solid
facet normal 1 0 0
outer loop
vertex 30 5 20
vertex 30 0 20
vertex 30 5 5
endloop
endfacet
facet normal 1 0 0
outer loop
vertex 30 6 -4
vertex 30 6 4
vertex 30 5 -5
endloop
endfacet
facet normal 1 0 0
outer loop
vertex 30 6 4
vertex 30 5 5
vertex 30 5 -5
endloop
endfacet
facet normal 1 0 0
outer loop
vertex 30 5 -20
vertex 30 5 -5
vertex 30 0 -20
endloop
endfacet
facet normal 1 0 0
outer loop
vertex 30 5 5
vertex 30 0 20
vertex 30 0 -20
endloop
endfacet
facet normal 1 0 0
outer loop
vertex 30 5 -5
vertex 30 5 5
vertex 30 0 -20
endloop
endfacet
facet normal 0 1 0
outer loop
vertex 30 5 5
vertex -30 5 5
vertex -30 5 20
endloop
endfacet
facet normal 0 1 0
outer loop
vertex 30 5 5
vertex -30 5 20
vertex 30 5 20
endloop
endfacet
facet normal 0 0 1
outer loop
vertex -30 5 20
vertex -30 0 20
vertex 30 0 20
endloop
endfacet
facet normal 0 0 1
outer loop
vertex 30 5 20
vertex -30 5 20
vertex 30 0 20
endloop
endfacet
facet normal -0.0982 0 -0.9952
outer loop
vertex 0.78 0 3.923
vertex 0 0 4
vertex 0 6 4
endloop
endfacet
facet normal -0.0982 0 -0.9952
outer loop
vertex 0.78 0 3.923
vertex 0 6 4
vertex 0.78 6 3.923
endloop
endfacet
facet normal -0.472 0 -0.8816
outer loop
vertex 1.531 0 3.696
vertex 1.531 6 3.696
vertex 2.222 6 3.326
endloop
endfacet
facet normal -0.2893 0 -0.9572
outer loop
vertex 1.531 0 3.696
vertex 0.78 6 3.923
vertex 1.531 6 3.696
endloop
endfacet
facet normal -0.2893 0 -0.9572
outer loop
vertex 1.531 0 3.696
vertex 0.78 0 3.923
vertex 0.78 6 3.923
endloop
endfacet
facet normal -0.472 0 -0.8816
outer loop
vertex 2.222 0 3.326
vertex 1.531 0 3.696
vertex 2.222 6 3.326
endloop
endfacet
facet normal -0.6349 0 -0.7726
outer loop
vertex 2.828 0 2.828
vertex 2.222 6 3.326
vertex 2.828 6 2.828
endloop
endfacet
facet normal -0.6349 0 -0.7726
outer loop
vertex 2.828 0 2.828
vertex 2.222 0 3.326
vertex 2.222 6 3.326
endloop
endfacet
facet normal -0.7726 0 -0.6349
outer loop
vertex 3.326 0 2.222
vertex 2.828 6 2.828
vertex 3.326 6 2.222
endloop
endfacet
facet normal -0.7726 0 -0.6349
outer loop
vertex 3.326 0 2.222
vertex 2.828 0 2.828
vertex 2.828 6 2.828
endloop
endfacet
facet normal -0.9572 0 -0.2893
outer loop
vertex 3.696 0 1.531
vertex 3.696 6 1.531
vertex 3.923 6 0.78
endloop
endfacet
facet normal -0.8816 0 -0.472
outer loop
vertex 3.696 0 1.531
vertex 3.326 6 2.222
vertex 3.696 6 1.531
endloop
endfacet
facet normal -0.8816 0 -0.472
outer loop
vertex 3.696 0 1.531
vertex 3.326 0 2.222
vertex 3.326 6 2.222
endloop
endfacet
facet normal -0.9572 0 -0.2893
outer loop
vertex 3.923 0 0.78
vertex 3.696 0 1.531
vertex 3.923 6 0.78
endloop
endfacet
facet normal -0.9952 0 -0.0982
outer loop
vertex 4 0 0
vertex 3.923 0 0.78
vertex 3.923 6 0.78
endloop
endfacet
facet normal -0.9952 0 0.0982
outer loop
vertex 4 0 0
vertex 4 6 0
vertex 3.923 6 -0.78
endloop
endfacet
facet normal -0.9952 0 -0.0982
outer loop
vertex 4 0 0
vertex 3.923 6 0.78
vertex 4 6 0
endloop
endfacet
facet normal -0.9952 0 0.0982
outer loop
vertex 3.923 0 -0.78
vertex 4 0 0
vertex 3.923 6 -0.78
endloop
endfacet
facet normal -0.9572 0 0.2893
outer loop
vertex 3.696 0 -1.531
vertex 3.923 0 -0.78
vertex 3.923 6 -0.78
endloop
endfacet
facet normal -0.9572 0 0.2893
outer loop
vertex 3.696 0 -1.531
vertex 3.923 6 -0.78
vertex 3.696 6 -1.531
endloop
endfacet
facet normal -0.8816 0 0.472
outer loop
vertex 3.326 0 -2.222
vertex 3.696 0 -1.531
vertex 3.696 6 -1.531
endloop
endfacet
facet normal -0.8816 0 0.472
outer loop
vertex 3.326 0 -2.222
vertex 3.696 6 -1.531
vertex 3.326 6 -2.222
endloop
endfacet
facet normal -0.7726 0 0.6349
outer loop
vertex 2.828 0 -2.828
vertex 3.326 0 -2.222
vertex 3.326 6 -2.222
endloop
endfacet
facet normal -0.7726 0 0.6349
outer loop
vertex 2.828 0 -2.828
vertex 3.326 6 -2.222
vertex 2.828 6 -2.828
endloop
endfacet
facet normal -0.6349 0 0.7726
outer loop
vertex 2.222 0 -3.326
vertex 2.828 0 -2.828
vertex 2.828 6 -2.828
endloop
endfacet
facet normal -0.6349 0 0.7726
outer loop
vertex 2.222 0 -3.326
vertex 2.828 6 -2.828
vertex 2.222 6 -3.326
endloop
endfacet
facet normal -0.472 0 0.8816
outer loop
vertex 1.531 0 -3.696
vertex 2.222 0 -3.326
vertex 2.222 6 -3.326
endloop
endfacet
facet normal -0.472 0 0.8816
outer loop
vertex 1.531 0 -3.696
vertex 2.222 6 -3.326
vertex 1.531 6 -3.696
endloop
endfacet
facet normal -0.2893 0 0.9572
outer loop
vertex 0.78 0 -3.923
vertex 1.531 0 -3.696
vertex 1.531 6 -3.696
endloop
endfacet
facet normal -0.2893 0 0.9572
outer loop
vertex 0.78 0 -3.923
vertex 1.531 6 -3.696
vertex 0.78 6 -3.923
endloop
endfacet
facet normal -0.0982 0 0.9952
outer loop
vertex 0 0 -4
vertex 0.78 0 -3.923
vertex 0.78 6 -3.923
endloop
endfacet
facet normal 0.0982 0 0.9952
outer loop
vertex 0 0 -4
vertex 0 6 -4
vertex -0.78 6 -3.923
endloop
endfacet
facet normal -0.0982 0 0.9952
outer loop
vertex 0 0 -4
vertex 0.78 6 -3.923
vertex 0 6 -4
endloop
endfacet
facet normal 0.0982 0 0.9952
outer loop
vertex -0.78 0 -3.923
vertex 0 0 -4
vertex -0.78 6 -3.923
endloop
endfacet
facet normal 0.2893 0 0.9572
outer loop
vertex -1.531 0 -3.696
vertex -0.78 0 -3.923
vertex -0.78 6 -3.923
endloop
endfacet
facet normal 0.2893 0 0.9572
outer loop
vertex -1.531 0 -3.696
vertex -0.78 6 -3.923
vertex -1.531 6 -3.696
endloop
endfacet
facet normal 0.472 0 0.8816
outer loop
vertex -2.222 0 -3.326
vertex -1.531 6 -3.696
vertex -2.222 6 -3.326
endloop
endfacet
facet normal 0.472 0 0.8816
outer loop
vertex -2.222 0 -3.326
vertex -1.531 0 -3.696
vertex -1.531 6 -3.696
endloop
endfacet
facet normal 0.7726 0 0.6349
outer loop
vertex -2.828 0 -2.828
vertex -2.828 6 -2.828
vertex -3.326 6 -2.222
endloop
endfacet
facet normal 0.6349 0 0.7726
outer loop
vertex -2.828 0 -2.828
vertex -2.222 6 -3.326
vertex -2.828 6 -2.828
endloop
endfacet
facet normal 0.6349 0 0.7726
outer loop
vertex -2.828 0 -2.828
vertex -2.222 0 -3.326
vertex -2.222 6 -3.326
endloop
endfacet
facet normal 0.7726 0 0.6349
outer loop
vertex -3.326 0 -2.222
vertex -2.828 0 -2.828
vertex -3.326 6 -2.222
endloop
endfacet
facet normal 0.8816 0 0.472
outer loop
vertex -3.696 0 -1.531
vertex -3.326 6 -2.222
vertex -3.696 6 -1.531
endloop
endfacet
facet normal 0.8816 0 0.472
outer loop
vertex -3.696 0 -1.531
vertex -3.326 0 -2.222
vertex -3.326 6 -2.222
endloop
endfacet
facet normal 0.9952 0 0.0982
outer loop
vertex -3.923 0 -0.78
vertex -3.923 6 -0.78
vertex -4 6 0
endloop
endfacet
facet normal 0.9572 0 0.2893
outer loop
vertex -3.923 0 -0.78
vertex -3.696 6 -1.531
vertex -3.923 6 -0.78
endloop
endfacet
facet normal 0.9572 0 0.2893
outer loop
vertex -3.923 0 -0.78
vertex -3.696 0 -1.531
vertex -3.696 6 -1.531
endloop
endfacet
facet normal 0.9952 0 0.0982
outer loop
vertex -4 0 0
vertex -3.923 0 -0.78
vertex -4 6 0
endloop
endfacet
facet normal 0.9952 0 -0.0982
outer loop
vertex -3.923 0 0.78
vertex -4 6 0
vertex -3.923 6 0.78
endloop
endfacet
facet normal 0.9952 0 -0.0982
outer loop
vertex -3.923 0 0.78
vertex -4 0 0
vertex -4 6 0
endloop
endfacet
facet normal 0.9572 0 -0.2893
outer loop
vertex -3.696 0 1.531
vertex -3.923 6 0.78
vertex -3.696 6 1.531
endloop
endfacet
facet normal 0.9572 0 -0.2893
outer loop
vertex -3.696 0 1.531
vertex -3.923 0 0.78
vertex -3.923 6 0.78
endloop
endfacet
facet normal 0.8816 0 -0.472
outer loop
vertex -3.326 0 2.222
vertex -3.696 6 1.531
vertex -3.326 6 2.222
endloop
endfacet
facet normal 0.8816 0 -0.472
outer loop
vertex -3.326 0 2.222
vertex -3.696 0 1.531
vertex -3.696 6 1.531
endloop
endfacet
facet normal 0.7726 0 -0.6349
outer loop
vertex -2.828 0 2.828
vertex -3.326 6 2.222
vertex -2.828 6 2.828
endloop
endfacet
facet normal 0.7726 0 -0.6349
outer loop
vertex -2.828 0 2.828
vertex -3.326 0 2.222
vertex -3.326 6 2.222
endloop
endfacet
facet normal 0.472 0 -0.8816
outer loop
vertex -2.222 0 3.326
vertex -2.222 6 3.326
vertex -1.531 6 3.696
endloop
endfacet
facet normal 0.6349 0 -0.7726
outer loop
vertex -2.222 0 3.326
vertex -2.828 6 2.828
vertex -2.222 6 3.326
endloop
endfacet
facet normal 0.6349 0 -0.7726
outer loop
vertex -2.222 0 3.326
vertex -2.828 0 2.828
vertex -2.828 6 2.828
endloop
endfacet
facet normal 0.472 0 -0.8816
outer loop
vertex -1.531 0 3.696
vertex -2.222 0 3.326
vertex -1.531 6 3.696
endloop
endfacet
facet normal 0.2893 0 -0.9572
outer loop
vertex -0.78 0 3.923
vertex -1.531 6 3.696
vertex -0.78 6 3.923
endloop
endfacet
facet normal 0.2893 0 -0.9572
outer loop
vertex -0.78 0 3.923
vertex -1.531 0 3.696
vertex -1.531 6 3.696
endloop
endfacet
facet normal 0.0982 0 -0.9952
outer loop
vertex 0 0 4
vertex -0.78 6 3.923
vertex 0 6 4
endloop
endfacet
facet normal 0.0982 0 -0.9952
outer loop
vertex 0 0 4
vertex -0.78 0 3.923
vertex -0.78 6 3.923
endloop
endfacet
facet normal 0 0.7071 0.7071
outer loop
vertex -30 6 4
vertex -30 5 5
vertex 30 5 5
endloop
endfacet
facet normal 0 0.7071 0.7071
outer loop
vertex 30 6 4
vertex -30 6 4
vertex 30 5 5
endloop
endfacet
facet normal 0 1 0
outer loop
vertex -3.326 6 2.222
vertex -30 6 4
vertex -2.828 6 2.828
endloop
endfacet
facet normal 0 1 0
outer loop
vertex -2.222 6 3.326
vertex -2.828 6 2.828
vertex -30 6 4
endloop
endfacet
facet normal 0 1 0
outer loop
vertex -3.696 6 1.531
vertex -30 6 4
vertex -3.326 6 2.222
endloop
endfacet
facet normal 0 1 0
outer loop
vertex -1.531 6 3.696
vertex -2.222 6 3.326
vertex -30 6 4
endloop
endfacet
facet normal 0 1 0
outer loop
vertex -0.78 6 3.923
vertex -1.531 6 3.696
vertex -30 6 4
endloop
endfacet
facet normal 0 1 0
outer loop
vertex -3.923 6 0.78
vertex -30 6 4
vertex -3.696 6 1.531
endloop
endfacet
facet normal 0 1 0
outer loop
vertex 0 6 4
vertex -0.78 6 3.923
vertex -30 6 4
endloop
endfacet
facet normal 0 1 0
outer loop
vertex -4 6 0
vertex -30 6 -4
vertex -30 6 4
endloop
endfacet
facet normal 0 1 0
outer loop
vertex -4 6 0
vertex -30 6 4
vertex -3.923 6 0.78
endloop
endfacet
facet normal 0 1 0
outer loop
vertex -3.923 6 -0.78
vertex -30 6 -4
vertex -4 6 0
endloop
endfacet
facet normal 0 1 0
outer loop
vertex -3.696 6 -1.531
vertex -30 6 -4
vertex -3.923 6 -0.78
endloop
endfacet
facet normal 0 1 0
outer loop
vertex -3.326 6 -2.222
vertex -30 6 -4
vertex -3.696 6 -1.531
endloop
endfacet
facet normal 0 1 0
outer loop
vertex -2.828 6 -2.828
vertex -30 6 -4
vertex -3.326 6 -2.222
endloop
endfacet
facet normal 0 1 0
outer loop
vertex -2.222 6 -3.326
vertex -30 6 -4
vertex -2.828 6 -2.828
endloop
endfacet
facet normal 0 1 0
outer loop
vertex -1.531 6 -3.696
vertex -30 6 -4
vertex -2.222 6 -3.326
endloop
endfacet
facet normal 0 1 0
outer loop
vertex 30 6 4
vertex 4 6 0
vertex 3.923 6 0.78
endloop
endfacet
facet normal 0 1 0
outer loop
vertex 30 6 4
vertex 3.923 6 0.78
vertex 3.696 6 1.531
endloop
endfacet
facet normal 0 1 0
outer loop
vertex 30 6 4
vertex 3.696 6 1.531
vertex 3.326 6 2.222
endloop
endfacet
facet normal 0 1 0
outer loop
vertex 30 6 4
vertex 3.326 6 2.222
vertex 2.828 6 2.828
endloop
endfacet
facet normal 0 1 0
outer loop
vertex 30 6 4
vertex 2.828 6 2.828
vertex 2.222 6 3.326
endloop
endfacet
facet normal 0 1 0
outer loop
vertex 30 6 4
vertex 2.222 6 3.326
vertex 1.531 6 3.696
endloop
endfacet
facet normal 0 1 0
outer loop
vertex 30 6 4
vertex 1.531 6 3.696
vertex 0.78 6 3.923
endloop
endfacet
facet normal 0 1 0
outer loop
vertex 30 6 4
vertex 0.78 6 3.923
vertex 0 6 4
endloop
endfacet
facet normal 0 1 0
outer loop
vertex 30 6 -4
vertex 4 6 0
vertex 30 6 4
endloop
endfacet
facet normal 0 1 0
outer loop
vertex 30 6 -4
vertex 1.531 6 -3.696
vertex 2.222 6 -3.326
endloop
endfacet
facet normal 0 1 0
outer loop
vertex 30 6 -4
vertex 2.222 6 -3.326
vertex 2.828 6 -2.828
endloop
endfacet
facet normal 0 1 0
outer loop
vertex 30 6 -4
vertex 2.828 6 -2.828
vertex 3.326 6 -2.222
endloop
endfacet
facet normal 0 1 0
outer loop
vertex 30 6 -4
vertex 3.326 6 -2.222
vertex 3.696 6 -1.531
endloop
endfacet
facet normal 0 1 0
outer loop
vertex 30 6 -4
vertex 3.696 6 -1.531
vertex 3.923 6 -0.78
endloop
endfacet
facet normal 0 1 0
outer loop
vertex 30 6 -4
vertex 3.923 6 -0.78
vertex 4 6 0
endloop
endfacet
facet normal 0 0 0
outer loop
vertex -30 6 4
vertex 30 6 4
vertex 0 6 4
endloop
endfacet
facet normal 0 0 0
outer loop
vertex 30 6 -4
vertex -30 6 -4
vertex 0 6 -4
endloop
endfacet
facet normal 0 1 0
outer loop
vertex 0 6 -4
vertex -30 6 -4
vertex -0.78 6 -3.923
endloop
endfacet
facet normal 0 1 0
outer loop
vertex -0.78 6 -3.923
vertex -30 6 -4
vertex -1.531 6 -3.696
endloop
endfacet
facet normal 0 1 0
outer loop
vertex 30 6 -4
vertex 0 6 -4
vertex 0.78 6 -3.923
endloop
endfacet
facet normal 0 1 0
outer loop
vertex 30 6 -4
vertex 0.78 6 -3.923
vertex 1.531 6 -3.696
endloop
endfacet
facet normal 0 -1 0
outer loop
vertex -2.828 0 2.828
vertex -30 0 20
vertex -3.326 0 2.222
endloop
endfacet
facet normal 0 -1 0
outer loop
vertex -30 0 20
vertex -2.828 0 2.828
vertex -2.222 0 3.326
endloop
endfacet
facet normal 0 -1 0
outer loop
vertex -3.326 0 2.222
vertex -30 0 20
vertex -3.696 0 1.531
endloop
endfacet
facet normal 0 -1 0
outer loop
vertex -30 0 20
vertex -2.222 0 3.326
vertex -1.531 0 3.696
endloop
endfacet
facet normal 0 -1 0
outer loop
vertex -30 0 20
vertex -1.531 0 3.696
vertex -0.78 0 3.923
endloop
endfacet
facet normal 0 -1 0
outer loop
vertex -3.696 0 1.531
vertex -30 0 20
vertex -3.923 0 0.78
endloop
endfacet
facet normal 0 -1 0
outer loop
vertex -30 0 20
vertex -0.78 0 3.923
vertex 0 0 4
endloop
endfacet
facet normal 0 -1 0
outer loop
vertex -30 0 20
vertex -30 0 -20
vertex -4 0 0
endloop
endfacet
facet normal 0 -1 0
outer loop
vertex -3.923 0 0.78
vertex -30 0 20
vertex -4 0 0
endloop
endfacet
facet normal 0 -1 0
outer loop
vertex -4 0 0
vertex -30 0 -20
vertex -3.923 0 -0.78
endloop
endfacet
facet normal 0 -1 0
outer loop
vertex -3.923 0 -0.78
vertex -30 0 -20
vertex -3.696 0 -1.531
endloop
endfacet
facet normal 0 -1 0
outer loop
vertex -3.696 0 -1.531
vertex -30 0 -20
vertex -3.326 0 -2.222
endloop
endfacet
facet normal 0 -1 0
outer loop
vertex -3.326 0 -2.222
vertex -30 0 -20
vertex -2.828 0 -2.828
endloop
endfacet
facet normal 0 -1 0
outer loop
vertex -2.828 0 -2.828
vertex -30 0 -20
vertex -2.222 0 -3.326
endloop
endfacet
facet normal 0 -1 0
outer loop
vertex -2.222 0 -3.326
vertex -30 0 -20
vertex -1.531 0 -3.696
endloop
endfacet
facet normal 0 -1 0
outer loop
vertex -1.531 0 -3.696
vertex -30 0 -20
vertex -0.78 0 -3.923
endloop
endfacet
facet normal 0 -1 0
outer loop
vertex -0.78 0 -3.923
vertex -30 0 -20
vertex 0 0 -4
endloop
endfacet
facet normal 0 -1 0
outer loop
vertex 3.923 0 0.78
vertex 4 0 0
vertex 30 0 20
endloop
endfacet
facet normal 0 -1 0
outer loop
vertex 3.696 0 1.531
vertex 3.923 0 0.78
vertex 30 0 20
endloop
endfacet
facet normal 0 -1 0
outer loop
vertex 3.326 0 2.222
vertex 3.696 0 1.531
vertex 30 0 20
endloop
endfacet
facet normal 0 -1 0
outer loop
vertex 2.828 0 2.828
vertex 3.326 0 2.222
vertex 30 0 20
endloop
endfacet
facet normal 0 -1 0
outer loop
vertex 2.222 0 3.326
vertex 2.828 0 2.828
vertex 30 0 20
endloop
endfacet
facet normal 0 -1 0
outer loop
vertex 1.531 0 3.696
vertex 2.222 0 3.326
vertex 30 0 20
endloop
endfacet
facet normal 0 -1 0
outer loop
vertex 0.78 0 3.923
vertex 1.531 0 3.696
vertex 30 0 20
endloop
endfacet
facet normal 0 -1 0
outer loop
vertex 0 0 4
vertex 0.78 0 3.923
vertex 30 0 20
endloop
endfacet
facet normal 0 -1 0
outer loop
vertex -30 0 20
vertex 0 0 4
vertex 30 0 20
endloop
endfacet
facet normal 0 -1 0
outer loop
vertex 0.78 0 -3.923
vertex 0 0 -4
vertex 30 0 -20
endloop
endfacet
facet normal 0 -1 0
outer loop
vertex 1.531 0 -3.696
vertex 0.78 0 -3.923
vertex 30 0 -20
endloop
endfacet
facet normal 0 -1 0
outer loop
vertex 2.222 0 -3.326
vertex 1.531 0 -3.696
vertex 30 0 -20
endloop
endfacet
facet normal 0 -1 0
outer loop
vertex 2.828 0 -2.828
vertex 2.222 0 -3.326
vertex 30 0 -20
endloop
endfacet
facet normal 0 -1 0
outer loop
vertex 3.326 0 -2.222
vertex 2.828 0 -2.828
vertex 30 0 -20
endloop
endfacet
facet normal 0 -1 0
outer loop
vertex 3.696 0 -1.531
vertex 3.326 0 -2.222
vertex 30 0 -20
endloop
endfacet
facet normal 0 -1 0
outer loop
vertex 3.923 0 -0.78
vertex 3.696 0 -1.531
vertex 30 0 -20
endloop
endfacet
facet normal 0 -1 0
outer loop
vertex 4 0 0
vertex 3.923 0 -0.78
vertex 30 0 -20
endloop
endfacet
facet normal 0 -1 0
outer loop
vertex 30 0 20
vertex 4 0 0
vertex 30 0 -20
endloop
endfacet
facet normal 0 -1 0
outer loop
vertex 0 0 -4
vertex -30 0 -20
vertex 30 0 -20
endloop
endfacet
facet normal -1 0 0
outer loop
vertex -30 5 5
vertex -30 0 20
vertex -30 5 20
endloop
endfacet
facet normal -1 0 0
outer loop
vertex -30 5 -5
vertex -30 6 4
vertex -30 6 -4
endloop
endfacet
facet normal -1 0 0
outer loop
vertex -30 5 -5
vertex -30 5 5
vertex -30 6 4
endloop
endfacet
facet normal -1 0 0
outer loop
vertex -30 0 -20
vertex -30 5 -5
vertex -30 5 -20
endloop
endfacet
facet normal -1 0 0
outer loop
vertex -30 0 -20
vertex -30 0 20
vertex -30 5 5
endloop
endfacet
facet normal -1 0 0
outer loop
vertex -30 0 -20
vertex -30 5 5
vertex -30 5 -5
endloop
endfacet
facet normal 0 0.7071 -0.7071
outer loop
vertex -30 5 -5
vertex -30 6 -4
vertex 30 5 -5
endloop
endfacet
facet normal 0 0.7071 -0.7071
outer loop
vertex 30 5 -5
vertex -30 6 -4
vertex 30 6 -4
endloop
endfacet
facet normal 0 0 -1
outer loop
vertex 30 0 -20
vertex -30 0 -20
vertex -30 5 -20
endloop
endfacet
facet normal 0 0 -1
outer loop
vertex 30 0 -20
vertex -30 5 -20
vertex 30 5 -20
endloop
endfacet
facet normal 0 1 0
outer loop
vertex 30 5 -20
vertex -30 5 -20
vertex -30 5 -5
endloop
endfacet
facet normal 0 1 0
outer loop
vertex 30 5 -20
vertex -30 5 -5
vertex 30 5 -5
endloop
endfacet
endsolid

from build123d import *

# Parameters (mm, degrees)
SZKIC1_W                        = 60
SZKIC1_H                        = 40
DODANIE_WYCI_GNI_CIE1_DEPTH     = 5
SZKIC2_W                        = 60
SZKIC2_H                        = 10
DODANIE_WYCI_GNI_CIE2_DEPTH     = 6
SFAZOWANIE1_SIZE                = 1
WYTNIJ_WYCI_GNI_CIE1_DEPTH      = 37.551333765
WYTNIJ_WYCI_GNI_CIE1_DEPTH_BACK = 37.551333765
SZKIC3_R                        = 4


with BuildPart() as part:
    # Szkic1 → Dodanie-wyciągnięcie1 (new body)
    with BuildSketch(Plane(origin=(0, 0, 0), x_dir=(1, 0, 0), z_dir=(0, 1, 0))):
        Rectangle(SZKIC1_W, SZKIC1_H)
    extrude(amount=DODANIE_WYCI_GNI_CIE1_DEPTH)

    # Szkic2 → Dodanie-wyciągnięcie2 (add)
    with BuildSketch(Plane(origin=(0, 0, 0), x_dir=(1, 0, 0), z_dir=(0, 1, 0))):
        Rectangle(SZKIC2_W, SZKIC2_H)
    extrude(amount=DODANIE_WYCI_GNI_CIE2_DEPTH)

    # Sfazowanie1
    sfazowanie1_edges = [part.edges().sort_by_distance(p)[0] for p in [
        (0, 6, -5),
        (0, 6, 5),
    ]]
    chamfer(sfazowanie1_edges, length=SFAZOWANIE1_SIZE - 0.0001)  # a hair under: the kernel refuses the full size

    # Szkic3 → Wytnij-wyciągnięcie1 (cut, two sides: drawn at the far end of the back side and taken through both)
    with BuildSketch(Plane(origin=(0, 0, 0), x_dir=(1, 0, 0), z_dir=(0, 1, 0)).offset(-WYTNIJ_WYCI_GNI_CIE1_DEPTH_BACK)):
        with Locations(Location((0, 0, 0), (0, 0, 270))):
            Circle(SZKIC3_R)
    extrude(amount=WYTNIJ_WYCI_GNI_CIE1_DEPTH + WYTNIJ_WYCI_GNI_CIE1_DEPTH_BACK, mode=Mode.SUBTRACT)


solid = part.part
